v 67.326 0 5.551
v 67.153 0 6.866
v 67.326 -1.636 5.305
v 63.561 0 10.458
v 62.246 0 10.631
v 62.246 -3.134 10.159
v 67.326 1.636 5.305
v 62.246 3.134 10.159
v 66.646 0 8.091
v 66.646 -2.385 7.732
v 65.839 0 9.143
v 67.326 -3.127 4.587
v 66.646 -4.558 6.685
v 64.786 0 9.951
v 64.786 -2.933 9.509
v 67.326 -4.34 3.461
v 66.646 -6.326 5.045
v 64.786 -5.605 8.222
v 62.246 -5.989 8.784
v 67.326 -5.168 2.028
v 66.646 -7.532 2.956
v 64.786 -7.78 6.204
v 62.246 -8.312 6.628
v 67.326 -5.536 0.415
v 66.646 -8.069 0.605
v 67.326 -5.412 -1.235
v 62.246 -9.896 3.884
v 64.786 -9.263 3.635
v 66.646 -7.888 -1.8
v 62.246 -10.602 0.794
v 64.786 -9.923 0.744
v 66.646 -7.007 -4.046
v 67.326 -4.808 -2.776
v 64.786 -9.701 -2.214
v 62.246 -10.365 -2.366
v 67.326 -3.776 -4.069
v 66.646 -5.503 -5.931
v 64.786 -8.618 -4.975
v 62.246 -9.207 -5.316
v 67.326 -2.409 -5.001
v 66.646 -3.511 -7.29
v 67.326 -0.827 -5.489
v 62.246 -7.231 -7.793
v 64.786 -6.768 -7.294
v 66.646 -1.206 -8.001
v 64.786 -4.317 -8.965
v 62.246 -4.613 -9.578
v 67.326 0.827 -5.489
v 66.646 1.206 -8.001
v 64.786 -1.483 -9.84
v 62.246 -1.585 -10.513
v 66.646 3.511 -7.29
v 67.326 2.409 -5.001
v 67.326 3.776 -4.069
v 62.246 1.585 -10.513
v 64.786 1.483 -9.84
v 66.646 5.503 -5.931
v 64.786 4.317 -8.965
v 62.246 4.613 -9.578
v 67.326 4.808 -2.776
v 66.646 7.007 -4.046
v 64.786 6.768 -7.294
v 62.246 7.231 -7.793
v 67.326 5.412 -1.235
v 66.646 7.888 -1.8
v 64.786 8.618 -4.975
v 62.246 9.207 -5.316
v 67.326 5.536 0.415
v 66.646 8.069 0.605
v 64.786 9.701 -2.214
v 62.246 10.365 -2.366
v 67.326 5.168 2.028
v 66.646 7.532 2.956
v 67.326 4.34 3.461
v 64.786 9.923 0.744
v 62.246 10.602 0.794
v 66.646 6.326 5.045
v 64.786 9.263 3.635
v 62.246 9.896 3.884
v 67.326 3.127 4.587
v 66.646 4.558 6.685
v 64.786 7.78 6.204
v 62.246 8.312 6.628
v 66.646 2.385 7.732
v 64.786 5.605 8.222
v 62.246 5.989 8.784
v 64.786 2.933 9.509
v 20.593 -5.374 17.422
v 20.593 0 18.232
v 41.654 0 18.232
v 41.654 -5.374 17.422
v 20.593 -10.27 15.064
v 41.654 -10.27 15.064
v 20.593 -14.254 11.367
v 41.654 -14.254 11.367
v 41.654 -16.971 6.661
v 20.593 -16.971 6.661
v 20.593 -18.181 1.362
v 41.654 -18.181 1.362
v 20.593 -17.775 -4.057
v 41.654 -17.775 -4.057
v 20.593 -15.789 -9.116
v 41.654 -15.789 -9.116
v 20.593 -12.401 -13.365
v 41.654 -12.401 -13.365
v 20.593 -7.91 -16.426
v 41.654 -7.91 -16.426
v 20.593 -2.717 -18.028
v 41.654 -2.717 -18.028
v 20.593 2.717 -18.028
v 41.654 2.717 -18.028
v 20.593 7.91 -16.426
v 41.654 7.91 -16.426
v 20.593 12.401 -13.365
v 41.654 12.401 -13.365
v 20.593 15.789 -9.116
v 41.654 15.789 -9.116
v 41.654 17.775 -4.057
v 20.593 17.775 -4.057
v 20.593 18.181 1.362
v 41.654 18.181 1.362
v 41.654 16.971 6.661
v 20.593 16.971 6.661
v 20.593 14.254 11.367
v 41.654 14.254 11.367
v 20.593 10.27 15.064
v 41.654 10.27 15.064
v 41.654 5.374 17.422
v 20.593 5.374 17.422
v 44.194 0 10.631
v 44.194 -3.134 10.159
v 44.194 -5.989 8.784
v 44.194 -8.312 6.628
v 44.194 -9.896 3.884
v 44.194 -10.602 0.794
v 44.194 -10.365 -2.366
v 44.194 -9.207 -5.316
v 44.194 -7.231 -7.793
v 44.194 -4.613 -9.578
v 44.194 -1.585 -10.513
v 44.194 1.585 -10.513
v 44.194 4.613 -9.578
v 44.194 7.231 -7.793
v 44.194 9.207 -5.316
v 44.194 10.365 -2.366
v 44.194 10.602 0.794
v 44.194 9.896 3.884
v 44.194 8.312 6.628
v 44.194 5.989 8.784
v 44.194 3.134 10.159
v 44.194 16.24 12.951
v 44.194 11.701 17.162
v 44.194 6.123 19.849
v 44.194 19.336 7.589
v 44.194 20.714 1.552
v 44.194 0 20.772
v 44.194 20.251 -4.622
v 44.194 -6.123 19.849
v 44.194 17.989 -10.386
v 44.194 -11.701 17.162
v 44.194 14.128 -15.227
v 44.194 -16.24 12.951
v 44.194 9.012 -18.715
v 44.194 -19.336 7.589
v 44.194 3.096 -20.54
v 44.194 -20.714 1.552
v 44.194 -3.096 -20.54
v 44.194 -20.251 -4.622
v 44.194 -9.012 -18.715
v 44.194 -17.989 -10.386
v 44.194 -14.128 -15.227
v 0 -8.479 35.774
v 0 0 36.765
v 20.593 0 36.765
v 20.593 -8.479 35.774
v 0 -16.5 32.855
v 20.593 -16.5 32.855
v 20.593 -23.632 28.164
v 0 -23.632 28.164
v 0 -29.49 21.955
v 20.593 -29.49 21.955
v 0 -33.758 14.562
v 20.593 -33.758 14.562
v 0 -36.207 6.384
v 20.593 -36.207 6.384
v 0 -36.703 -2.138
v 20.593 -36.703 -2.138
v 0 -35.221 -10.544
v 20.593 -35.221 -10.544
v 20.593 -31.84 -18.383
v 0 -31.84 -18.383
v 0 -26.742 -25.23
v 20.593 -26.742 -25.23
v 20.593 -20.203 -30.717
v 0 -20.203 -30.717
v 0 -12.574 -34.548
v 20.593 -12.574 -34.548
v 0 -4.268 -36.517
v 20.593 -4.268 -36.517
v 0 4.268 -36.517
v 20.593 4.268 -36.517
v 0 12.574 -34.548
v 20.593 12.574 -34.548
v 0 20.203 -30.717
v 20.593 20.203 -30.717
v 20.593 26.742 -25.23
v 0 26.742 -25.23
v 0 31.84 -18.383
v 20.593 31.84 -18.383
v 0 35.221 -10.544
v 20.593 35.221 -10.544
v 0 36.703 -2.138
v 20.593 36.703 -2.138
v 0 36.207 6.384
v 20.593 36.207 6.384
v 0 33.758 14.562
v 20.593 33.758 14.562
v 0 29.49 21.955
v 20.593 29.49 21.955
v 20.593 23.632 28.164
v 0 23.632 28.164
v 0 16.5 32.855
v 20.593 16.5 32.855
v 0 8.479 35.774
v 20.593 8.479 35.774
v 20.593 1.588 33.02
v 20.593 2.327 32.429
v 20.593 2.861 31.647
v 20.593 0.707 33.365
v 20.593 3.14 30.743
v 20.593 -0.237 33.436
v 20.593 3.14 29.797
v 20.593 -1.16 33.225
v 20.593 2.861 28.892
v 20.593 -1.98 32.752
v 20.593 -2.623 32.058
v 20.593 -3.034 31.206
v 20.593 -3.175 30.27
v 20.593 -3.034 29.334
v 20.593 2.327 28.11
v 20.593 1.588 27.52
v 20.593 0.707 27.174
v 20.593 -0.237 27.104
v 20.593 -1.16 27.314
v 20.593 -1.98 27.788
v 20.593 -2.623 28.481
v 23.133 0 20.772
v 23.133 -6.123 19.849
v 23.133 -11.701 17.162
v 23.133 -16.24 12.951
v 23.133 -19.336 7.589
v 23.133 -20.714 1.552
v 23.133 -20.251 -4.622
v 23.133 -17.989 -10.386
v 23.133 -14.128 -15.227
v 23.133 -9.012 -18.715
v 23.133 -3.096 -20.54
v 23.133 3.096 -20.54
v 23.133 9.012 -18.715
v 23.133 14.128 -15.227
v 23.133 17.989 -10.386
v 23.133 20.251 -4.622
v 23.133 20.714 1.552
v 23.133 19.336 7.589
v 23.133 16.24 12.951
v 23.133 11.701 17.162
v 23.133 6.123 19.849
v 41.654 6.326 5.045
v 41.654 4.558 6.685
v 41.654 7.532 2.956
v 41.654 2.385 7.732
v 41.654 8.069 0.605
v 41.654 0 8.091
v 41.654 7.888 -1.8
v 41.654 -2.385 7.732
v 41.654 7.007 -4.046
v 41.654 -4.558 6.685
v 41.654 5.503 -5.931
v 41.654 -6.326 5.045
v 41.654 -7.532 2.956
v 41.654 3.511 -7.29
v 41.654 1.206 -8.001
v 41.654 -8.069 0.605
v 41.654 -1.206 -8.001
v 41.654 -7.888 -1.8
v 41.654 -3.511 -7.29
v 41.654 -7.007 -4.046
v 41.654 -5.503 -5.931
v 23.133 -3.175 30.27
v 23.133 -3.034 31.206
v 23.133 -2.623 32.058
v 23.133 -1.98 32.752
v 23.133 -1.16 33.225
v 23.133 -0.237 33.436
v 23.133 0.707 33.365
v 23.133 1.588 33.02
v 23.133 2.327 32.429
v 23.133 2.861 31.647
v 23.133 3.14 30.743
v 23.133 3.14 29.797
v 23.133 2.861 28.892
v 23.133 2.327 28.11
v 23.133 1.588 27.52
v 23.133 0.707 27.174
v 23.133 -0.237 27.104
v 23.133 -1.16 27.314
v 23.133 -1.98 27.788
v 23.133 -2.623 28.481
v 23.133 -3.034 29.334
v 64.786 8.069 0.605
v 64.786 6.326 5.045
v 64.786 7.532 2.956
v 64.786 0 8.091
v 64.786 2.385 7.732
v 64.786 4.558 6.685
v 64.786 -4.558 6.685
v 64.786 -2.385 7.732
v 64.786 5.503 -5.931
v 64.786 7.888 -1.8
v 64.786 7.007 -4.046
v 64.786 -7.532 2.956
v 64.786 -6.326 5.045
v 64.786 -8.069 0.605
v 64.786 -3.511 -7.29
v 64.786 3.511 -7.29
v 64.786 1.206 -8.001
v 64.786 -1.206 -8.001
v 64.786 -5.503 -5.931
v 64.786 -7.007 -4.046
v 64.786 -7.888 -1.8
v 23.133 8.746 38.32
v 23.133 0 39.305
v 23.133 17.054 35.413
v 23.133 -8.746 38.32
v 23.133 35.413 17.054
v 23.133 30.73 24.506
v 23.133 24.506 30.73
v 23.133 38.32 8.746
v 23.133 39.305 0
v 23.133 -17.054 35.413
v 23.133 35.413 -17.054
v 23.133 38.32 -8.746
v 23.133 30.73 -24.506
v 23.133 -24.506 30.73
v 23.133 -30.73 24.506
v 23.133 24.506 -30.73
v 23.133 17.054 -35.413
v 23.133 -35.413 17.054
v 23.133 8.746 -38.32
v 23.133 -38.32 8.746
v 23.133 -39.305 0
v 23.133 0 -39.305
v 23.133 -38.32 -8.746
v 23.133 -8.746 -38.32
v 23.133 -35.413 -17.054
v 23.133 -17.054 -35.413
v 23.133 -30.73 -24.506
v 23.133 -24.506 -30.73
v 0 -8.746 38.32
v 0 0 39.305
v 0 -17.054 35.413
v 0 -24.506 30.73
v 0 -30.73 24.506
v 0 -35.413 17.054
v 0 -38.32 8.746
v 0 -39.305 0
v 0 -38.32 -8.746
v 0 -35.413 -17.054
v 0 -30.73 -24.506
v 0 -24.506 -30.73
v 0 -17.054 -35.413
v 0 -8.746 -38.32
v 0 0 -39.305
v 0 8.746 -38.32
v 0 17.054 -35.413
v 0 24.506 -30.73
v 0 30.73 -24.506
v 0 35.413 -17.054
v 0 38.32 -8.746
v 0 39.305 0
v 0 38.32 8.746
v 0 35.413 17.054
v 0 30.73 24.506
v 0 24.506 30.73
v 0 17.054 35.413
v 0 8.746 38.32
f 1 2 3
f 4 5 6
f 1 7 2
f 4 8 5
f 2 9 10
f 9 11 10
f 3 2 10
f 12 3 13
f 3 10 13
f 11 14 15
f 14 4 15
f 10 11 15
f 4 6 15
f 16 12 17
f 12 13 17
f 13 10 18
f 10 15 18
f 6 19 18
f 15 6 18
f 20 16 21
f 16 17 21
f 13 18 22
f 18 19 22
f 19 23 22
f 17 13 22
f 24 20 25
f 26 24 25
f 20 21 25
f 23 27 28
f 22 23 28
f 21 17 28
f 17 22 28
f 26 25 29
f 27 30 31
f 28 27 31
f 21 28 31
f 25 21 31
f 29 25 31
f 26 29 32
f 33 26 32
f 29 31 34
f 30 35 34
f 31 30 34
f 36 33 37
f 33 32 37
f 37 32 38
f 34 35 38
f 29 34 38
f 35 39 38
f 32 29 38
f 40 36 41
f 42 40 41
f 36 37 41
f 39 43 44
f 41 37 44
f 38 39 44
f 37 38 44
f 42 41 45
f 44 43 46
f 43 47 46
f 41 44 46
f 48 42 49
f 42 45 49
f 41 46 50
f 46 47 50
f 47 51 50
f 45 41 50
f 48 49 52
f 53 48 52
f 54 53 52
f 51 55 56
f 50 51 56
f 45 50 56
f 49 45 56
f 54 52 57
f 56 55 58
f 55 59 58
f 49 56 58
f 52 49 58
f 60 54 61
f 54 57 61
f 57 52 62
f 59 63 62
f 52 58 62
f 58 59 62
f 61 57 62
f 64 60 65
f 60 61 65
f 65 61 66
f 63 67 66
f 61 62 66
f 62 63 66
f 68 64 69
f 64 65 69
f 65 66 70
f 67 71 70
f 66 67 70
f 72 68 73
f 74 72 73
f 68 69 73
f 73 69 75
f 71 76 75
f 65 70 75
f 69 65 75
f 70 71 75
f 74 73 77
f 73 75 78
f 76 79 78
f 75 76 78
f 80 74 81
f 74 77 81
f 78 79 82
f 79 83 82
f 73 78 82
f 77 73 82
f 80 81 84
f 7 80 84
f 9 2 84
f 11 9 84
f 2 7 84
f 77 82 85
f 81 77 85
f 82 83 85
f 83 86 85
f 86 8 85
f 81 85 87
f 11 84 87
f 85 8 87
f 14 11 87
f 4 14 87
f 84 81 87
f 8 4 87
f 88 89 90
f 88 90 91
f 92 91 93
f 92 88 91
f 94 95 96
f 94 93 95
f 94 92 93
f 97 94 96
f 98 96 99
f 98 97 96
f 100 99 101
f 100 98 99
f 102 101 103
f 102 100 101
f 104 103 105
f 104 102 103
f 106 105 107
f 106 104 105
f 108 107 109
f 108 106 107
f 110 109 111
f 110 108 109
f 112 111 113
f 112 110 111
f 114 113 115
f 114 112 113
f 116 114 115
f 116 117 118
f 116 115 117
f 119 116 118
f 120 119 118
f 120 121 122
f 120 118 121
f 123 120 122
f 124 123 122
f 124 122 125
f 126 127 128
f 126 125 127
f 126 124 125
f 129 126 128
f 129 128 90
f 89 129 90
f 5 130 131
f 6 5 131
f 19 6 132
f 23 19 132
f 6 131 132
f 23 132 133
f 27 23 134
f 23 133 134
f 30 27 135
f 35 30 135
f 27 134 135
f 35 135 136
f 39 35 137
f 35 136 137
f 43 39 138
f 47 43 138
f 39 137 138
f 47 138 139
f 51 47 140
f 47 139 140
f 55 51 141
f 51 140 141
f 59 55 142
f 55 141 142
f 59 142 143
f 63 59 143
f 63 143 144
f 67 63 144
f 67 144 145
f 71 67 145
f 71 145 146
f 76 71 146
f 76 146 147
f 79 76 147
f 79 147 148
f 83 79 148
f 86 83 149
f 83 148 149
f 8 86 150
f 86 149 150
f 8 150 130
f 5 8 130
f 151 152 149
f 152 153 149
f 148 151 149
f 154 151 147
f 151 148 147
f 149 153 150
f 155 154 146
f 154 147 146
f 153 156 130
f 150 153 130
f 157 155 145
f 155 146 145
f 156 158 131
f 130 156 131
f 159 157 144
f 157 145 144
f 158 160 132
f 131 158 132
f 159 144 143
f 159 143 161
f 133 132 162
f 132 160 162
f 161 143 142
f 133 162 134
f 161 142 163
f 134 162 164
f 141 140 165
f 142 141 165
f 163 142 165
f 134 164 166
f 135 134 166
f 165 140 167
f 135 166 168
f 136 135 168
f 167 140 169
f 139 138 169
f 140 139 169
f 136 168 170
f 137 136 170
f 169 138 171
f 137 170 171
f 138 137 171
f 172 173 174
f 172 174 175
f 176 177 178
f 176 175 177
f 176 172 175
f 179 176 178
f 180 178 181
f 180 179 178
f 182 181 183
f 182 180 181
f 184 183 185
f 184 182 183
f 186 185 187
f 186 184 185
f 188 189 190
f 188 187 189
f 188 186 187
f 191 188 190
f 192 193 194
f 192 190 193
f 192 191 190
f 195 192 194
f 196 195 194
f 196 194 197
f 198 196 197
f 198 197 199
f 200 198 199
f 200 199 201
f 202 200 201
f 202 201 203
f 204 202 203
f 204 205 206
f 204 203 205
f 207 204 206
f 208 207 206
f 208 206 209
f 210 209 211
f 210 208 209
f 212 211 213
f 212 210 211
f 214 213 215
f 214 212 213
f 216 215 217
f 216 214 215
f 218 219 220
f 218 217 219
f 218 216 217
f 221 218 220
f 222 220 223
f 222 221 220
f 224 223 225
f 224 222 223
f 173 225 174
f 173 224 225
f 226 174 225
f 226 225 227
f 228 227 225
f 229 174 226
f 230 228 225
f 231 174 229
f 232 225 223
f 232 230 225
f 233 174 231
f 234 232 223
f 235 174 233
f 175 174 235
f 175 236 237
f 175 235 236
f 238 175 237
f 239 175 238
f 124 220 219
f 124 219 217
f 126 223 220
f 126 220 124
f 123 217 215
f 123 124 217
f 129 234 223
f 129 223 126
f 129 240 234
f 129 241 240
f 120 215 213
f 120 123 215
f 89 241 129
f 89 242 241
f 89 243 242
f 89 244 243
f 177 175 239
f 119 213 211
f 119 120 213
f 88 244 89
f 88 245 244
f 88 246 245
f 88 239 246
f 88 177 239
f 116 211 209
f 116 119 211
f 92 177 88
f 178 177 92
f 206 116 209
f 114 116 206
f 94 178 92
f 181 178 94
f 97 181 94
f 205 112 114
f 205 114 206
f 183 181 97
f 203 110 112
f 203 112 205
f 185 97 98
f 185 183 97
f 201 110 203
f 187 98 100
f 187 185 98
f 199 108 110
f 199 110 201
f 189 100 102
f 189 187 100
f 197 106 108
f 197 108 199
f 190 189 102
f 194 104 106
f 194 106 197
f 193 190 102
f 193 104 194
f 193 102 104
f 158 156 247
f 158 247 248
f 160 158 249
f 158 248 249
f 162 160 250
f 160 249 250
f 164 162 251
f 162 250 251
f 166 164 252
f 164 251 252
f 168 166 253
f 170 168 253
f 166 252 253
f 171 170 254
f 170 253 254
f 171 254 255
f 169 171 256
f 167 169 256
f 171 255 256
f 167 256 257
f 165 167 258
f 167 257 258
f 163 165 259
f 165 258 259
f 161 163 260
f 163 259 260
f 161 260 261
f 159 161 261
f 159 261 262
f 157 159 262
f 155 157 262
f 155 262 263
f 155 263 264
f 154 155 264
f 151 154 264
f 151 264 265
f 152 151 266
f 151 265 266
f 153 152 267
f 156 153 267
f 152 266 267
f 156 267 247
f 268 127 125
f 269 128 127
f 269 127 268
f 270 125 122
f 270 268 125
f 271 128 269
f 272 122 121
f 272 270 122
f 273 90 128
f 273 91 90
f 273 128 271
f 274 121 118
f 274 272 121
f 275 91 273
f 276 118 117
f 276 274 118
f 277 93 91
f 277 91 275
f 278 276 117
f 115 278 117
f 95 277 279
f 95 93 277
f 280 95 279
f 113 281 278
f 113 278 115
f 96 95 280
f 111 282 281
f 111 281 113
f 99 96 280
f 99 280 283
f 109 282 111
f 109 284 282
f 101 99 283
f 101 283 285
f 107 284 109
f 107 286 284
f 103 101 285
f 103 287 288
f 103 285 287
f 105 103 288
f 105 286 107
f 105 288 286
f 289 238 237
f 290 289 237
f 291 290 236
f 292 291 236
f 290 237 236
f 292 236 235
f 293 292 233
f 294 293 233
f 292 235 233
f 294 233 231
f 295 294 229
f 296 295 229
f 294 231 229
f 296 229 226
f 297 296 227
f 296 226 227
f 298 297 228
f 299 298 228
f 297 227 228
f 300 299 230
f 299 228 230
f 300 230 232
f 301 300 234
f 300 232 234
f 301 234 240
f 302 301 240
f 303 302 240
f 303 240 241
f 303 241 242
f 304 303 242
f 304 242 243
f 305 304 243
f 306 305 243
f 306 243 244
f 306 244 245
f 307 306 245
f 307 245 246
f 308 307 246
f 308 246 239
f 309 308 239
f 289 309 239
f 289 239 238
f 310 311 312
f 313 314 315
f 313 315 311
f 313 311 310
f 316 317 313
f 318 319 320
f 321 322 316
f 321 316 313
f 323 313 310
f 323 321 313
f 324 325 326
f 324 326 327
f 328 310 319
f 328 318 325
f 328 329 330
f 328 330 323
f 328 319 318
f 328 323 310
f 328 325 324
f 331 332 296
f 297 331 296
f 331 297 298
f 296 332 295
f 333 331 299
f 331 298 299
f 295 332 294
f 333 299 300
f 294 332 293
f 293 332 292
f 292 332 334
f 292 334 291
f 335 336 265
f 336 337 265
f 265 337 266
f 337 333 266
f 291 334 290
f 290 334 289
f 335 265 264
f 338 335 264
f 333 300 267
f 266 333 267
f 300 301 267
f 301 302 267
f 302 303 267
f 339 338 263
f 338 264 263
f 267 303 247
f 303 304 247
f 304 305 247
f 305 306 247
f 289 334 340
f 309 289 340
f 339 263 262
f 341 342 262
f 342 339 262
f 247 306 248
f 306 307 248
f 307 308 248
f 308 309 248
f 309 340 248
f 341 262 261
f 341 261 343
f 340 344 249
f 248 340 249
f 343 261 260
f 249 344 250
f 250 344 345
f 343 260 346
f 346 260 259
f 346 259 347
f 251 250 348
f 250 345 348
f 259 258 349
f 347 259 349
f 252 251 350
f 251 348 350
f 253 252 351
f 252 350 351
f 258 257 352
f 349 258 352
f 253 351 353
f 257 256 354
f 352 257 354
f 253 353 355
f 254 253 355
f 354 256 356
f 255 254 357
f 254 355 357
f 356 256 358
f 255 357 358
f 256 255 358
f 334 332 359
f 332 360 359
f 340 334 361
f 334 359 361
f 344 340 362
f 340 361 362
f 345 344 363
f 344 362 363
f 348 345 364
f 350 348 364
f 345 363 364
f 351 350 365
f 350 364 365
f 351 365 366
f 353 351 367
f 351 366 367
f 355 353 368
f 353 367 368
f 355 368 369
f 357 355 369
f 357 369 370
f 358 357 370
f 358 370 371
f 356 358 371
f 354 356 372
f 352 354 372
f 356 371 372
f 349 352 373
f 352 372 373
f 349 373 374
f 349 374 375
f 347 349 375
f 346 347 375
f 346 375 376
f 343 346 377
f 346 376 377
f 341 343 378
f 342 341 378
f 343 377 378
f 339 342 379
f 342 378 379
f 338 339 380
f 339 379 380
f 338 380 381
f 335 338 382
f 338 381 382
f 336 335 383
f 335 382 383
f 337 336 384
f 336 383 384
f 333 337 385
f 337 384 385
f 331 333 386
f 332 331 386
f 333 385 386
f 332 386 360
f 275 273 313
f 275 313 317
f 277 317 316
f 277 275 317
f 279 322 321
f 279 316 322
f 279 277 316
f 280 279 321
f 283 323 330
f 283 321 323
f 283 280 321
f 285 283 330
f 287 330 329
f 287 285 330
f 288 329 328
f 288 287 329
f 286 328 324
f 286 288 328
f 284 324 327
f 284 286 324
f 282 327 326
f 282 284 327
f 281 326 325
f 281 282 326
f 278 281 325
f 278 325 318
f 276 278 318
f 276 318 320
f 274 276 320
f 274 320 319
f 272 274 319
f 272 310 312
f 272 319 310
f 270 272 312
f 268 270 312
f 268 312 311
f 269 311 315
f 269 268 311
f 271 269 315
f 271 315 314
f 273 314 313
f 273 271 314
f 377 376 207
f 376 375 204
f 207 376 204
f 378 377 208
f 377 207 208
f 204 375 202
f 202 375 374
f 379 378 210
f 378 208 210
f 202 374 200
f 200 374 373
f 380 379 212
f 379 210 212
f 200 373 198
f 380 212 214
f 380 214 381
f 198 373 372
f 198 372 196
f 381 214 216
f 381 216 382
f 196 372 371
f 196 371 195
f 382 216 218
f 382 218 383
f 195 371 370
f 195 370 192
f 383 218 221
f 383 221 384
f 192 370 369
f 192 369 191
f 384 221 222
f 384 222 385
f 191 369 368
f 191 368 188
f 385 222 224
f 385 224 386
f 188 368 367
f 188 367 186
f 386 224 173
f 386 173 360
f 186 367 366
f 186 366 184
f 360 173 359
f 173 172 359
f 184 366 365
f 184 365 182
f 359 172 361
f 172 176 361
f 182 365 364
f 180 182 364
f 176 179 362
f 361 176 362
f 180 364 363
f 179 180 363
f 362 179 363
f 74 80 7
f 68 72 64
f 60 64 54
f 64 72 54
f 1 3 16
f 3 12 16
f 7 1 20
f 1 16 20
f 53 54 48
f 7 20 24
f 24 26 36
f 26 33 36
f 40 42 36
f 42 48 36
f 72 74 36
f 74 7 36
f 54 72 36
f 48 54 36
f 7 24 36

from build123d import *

# Parameters (mm, degrees)
F2_T = -2.54
F3_R = 5.08
F5_D = 6.35


with BuildPart() as f1:
    # F0 (on Front) → F1 (revolve)
    with BuildSketch(Plane.XZ):
        Polygon((0, 39.3052697182), (0, 0), (67.3264637589, 0), (67.3264637589, 10.6312446296), (44.1937856376, 10.6312446296), (44.1937856376, 20.7716822624), (23.1326818466, 20.7716822624), (23.1326818466, 39.3052697182), align=None)
    revolve(axis=Axis((33.6632318795, 0, 0), (1, 0, 0)))

    # F2
    f2_openings = [f1.faces().sort_by_distance(p)[0] for p in [
        (0, 0, 0),
    ]]
    offset(amount=F2_T, openings=f2_openings, kind=Kind.INTERSECTION)

    # F3
    f3_edges = [f1.edges().sort_by_distance(p)[0] for p in [
        (67.326464, 0, -10.631245),
    ]]
    fillet(f3_edges, radius=F3_R)

    # F5 (through all)
    with Locations(Plane.YZ.offset(23.1326818466)):
        with Locations((0, 30.2698779851)):
            Hole(F5_D / 2)


solid = f1.part
